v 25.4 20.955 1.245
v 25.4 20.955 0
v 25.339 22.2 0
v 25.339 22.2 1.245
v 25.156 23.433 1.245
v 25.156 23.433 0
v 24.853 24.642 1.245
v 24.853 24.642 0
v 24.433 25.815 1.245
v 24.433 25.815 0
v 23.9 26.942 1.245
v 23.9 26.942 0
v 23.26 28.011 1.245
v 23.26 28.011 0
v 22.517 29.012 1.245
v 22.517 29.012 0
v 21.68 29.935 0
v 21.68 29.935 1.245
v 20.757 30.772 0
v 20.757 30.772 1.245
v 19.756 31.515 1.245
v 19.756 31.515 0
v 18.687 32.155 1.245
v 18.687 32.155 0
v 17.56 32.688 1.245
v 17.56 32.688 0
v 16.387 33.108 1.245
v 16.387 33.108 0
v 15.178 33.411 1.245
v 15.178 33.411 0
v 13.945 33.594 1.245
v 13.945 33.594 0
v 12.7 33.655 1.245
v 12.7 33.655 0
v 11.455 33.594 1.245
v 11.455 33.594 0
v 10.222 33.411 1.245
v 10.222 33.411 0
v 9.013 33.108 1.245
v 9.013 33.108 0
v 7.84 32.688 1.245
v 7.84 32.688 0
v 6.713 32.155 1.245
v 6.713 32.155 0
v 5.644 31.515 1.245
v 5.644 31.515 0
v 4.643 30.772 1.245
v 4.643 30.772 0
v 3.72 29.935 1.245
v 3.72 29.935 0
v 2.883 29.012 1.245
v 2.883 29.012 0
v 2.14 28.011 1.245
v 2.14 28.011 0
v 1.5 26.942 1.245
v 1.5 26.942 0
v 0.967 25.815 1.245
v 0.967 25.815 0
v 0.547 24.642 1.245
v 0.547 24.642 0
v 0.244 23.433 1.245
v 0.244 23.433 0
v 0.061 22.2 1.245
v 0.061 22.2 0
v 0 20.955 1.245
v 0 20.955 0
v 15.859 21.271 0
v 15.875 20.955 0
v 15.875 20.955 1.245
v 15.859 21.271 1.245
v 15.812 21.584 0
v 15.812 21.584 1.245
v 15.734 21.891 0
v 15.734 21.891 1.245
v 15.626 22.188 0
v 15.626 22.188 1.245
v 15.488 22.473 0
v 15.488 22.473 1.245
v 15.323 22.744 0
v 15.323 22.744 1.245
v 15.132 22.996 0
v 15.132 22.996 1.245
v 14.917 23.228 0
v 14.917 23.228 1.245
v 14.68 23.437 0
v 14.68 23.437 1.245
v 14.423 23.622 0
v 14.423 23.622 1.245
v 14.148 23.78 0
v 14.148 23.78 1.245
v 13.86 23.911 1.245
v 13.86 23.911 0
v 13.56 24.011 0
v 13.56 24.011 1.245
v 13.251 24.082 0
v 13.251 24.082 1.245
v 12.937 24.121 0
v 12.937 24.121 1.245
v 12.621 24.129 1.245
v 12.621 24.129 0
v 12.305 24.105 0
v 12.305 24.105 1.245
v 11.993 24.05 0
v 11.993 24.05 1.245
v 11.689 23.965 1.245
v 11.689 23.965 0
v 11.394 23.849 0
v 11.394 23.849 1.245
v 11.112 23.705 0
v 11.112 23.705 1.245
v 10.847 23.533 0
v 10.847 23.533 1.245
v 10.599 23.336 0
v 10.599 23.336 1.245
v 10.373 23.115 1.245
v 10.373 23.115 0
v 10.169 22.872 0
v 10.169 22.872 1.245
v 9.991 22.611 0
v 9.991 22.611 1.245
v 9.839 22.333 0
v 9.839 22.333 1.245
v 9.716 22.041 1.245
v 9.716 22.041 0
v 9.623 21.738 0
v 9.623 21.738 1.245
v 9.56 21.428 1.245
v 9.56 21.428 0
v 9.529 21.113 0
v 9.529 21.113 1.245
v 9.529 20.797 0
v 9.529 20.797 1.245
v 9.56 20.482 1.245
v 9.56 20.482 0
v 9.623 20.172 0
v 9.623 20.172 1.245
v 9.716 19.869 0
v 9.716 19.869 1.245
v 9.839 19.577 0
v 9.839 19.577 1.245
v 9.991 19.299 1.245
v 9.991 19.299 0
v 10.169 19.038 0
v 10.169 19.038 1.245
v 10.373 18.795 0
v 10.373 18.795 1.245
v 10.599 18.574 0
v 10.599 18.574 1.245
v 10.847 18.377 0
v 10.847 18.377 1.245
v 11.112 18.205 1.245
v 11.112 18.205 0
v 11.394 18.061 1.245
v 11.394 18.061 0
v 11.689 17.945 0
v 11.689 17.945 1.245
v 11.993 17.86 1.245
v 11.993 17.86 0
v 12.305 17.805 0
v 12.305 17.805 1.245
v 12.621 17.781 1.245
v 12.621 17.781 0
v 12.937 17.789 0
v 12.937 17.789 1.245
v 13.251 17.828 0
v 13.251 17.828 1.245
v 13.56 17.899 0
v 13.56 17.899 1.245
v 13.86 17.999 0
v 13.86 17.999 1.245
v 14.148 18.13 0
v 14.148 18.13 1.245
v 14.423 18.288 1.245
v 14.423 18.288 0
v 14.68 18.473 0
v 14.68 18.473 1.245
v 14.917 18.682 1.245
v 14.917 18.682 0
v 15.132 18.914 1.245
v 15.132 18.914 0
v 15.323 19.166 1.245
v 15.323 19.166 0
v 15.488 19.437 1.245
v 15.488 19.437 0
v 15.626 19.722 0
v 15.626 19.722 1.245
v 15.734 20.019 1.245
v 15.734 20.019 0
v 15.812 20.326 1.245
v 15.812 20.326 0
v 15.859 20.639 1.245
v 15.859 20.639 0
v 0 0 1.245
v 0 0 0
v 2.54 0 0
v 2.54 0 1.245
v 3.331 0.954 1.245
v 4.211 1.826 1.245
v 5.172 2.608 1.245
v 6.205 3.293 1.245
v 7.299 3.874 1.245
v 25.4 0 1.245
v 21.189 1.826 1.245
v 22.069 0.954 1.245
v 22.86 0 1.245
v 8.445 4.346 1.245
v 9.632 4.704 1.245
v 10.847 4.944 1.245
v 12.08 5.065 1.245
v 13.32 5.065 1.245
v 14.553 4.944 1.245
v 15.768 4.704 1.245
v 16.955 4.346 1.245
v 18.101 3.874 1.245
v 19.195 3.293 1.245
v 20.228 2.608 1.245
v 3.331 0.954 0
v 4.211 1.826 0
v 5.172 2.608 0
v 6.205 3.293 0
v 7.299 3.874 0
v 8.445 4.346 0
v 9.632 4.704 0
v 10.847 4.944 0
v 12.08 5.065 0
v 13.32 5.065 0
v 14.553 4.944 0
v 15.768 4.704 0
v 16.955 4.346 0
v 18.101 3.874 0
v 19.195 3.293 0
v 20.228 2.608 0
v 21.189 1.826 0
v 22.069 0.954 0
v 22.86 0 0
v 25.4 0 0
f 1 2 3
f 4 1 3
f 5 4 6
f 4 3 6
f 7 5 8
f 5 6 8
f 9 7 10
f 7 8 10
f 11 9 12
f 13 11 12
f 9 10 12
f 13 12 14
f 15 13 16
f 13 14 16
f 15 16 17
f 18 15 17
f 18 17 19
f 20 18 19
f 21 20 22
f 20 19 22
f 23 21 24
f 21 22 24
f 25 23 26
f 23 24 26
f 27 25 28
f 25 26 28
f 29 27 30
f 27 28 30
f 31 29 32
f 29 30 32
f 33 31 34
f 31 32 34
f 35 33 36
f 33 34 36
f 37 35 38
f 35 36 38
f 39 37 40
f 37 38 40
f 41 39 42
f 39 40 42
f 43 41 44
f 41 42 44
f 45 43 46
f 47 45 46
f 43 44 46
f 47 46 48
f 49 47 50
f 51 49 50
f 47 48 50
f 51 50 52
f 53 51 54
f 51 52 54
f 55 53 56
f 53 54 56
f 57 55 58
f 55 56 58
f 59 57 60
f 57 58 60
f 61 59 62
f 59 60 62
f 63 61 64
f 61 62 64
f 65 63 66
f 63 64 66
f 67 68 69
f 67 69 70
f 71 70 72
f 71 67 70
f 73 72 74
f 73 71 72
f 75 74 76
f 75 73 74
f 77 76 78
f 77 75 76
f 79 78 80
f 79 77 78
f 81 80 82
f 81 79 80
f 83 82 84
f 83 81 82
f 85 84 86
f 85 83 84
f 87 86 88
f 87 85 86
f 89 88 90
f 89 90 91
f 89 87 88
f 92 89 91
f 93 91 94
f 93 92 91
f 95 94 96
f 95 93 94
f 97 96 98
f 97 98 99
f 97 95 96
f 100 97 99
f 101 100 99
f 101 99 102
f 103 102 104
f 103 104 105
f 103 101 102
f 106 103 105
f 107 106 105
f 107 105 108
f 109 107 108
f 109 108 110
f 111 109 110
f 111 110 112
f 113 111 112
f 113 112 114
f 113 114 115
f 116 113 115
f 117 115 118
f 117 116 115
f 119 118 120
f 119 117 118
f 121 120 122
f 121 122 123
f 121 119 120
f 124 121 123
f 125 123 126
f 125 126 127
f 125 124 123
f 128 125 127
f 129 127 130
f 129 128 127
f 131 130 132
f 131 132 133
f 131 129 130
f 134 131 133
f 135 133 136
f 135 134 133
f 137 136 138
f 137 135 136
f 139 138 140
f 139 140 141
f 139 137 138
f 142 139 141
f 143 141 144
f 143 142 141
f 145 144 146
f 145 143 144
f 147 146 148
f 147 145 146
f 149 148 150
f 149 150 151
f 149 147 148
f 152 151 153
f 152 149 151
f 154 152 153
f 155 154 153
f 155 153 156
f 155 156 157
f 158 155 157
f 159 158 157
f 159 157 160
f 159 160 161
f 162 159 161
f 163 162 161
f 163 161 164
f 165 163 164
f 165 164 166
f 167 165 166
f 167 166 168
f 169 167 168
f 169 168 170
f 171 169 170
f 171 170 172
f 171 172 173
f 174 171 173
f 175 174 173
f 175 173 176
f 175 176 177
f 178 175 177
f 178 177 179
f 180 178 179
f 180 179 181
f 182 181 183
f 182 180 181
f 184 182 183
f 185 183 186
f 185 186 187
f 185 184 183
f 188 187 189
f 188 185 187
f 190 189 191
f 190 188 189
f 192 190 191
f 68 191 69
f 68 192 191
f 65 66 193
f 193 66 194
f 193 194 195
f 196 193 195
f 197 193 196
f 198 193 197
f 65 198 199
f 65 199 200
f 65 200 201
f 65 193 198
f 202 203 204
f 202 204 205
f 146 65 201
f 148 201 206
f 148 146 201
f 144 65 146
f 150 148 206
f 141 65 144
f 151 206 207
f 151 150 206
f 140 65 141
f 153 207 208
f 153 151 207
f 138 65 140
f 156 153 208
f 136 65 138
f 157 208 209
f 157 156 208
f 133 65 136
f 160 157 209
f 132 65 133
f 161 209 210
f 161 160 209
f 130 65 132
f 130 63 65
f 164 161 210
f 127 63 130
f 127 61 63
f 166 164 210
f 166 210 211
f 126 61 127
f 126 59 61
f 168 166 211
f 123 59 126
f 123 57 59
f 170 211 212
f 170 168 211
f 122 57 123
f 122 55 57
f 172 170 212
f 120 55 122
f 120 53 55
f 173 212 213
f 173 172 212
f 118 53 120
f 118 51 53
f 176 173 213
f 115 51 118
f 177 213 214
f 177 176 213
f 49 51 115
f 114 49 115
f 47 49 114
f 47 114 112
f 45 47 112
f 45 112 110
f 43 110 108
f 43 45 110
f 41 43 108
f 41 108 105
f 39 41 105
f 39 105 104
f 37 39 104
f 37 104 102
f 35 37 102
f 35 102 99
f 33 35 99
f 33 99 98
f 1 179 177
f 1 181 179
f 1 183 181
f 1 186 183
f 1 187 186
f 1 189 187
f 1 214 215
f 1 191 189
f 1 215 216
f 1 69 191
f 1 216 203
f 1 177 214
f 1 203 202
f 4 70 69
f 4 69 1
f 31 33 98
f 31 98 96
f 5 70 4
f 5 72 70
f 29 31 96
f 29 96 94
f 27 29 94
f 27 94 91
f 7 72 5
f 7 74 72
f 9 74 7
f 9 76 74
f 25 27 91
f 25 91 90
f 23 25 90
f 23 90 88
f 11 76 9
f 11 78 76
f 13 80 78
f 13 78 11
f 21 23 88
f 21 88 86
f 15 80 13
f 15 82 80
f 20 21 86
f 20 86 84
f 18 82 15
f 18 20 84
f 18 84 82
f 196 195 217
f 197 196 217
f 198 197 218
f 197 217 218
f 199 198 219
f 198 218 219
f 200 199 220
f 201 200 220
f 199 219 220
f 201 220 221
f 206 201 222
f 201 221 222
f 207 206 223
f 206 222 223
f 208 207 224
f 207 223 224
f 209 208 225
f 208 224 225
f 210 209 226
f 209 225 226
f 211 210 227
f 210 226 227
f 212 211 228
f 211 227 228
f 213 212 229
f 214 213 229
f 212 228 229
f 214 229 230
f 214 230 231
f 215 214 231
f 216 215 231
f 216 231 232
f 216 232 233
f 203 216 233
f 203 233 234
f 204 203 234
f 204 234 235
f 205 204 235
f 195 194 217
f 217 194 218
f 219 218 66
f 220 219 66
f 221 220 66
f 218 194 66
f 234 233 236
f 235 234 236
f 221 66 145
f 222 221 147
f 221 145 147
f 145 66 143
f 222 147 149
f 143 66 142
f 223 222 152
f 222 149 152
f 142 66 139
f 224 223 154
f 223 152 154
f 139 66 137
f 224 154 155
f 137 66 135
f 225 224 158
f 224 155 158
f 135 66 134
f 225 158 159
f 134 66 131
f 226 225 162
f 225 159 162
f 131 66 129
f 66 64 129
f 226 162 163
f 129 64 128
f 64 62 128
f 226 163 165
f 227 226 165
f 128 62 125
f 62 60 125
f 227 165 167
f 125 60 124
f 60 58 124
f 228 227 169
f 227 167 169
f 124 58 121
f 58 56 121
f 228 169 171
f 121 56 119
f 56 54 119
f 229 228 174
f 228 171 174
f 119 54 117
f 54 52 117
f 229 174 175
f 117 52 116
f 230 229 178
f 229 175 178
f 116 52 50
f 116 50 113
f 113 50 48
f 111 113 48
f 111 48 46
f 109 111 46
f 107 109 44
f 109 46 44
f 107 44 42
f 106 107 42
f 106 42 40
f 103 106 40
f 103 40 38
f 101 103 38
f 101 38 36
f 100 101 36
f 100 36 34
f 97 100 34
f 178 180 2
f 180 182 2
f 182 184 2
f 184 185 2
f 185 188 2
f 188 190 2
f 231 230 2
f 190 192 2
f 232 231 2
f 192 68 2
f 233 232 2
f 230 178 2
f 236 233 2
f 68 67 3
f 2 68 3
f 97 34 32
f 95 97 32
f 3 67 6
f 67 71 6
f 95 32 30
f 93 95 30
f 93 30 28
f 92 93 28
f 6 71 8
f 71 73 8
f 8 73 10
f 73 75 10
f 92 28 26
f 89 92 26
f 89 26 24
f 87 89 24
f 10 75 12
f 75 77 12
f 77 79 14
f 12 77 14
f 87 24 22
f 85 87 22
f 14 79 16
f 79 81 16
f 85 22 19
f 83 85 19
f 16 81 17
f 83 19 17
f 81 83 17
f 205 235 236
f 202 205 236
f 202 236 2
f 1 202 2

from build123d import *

# Parameters (mm, degrees)
SKETCH1_R           = 3.175
BOSS_EXTRUDE1_DEPTH = 1.2446


with BuildPart() as part:
    # Sketch1 → Boss-Extrude1 (new body)
    with BuildSketch(Plane.XY):
        with BuildLine():
            Line((0, 0), (2.54, 0))
            ThreePointArc((2.54, 0), (12.7, 5.08), (22.86, 0))
            Line((22.86, 0), (25.4, 0))
            Line((25.4, 0), (25.4, 20.955))
            ThreePointArc((25.4, 20.955), (12.7, 33.655), (0, 20.955))
            Line((0, 20.955), (0, 0))
        make_face()
        with Locations((12.7, 20.955)):
            Circle(SKETCH1_R, mode=Mode.SUBTRACT)
    extrude(amount=BOSS_EXTRUDE1_DEPTH)


solid = part.part
